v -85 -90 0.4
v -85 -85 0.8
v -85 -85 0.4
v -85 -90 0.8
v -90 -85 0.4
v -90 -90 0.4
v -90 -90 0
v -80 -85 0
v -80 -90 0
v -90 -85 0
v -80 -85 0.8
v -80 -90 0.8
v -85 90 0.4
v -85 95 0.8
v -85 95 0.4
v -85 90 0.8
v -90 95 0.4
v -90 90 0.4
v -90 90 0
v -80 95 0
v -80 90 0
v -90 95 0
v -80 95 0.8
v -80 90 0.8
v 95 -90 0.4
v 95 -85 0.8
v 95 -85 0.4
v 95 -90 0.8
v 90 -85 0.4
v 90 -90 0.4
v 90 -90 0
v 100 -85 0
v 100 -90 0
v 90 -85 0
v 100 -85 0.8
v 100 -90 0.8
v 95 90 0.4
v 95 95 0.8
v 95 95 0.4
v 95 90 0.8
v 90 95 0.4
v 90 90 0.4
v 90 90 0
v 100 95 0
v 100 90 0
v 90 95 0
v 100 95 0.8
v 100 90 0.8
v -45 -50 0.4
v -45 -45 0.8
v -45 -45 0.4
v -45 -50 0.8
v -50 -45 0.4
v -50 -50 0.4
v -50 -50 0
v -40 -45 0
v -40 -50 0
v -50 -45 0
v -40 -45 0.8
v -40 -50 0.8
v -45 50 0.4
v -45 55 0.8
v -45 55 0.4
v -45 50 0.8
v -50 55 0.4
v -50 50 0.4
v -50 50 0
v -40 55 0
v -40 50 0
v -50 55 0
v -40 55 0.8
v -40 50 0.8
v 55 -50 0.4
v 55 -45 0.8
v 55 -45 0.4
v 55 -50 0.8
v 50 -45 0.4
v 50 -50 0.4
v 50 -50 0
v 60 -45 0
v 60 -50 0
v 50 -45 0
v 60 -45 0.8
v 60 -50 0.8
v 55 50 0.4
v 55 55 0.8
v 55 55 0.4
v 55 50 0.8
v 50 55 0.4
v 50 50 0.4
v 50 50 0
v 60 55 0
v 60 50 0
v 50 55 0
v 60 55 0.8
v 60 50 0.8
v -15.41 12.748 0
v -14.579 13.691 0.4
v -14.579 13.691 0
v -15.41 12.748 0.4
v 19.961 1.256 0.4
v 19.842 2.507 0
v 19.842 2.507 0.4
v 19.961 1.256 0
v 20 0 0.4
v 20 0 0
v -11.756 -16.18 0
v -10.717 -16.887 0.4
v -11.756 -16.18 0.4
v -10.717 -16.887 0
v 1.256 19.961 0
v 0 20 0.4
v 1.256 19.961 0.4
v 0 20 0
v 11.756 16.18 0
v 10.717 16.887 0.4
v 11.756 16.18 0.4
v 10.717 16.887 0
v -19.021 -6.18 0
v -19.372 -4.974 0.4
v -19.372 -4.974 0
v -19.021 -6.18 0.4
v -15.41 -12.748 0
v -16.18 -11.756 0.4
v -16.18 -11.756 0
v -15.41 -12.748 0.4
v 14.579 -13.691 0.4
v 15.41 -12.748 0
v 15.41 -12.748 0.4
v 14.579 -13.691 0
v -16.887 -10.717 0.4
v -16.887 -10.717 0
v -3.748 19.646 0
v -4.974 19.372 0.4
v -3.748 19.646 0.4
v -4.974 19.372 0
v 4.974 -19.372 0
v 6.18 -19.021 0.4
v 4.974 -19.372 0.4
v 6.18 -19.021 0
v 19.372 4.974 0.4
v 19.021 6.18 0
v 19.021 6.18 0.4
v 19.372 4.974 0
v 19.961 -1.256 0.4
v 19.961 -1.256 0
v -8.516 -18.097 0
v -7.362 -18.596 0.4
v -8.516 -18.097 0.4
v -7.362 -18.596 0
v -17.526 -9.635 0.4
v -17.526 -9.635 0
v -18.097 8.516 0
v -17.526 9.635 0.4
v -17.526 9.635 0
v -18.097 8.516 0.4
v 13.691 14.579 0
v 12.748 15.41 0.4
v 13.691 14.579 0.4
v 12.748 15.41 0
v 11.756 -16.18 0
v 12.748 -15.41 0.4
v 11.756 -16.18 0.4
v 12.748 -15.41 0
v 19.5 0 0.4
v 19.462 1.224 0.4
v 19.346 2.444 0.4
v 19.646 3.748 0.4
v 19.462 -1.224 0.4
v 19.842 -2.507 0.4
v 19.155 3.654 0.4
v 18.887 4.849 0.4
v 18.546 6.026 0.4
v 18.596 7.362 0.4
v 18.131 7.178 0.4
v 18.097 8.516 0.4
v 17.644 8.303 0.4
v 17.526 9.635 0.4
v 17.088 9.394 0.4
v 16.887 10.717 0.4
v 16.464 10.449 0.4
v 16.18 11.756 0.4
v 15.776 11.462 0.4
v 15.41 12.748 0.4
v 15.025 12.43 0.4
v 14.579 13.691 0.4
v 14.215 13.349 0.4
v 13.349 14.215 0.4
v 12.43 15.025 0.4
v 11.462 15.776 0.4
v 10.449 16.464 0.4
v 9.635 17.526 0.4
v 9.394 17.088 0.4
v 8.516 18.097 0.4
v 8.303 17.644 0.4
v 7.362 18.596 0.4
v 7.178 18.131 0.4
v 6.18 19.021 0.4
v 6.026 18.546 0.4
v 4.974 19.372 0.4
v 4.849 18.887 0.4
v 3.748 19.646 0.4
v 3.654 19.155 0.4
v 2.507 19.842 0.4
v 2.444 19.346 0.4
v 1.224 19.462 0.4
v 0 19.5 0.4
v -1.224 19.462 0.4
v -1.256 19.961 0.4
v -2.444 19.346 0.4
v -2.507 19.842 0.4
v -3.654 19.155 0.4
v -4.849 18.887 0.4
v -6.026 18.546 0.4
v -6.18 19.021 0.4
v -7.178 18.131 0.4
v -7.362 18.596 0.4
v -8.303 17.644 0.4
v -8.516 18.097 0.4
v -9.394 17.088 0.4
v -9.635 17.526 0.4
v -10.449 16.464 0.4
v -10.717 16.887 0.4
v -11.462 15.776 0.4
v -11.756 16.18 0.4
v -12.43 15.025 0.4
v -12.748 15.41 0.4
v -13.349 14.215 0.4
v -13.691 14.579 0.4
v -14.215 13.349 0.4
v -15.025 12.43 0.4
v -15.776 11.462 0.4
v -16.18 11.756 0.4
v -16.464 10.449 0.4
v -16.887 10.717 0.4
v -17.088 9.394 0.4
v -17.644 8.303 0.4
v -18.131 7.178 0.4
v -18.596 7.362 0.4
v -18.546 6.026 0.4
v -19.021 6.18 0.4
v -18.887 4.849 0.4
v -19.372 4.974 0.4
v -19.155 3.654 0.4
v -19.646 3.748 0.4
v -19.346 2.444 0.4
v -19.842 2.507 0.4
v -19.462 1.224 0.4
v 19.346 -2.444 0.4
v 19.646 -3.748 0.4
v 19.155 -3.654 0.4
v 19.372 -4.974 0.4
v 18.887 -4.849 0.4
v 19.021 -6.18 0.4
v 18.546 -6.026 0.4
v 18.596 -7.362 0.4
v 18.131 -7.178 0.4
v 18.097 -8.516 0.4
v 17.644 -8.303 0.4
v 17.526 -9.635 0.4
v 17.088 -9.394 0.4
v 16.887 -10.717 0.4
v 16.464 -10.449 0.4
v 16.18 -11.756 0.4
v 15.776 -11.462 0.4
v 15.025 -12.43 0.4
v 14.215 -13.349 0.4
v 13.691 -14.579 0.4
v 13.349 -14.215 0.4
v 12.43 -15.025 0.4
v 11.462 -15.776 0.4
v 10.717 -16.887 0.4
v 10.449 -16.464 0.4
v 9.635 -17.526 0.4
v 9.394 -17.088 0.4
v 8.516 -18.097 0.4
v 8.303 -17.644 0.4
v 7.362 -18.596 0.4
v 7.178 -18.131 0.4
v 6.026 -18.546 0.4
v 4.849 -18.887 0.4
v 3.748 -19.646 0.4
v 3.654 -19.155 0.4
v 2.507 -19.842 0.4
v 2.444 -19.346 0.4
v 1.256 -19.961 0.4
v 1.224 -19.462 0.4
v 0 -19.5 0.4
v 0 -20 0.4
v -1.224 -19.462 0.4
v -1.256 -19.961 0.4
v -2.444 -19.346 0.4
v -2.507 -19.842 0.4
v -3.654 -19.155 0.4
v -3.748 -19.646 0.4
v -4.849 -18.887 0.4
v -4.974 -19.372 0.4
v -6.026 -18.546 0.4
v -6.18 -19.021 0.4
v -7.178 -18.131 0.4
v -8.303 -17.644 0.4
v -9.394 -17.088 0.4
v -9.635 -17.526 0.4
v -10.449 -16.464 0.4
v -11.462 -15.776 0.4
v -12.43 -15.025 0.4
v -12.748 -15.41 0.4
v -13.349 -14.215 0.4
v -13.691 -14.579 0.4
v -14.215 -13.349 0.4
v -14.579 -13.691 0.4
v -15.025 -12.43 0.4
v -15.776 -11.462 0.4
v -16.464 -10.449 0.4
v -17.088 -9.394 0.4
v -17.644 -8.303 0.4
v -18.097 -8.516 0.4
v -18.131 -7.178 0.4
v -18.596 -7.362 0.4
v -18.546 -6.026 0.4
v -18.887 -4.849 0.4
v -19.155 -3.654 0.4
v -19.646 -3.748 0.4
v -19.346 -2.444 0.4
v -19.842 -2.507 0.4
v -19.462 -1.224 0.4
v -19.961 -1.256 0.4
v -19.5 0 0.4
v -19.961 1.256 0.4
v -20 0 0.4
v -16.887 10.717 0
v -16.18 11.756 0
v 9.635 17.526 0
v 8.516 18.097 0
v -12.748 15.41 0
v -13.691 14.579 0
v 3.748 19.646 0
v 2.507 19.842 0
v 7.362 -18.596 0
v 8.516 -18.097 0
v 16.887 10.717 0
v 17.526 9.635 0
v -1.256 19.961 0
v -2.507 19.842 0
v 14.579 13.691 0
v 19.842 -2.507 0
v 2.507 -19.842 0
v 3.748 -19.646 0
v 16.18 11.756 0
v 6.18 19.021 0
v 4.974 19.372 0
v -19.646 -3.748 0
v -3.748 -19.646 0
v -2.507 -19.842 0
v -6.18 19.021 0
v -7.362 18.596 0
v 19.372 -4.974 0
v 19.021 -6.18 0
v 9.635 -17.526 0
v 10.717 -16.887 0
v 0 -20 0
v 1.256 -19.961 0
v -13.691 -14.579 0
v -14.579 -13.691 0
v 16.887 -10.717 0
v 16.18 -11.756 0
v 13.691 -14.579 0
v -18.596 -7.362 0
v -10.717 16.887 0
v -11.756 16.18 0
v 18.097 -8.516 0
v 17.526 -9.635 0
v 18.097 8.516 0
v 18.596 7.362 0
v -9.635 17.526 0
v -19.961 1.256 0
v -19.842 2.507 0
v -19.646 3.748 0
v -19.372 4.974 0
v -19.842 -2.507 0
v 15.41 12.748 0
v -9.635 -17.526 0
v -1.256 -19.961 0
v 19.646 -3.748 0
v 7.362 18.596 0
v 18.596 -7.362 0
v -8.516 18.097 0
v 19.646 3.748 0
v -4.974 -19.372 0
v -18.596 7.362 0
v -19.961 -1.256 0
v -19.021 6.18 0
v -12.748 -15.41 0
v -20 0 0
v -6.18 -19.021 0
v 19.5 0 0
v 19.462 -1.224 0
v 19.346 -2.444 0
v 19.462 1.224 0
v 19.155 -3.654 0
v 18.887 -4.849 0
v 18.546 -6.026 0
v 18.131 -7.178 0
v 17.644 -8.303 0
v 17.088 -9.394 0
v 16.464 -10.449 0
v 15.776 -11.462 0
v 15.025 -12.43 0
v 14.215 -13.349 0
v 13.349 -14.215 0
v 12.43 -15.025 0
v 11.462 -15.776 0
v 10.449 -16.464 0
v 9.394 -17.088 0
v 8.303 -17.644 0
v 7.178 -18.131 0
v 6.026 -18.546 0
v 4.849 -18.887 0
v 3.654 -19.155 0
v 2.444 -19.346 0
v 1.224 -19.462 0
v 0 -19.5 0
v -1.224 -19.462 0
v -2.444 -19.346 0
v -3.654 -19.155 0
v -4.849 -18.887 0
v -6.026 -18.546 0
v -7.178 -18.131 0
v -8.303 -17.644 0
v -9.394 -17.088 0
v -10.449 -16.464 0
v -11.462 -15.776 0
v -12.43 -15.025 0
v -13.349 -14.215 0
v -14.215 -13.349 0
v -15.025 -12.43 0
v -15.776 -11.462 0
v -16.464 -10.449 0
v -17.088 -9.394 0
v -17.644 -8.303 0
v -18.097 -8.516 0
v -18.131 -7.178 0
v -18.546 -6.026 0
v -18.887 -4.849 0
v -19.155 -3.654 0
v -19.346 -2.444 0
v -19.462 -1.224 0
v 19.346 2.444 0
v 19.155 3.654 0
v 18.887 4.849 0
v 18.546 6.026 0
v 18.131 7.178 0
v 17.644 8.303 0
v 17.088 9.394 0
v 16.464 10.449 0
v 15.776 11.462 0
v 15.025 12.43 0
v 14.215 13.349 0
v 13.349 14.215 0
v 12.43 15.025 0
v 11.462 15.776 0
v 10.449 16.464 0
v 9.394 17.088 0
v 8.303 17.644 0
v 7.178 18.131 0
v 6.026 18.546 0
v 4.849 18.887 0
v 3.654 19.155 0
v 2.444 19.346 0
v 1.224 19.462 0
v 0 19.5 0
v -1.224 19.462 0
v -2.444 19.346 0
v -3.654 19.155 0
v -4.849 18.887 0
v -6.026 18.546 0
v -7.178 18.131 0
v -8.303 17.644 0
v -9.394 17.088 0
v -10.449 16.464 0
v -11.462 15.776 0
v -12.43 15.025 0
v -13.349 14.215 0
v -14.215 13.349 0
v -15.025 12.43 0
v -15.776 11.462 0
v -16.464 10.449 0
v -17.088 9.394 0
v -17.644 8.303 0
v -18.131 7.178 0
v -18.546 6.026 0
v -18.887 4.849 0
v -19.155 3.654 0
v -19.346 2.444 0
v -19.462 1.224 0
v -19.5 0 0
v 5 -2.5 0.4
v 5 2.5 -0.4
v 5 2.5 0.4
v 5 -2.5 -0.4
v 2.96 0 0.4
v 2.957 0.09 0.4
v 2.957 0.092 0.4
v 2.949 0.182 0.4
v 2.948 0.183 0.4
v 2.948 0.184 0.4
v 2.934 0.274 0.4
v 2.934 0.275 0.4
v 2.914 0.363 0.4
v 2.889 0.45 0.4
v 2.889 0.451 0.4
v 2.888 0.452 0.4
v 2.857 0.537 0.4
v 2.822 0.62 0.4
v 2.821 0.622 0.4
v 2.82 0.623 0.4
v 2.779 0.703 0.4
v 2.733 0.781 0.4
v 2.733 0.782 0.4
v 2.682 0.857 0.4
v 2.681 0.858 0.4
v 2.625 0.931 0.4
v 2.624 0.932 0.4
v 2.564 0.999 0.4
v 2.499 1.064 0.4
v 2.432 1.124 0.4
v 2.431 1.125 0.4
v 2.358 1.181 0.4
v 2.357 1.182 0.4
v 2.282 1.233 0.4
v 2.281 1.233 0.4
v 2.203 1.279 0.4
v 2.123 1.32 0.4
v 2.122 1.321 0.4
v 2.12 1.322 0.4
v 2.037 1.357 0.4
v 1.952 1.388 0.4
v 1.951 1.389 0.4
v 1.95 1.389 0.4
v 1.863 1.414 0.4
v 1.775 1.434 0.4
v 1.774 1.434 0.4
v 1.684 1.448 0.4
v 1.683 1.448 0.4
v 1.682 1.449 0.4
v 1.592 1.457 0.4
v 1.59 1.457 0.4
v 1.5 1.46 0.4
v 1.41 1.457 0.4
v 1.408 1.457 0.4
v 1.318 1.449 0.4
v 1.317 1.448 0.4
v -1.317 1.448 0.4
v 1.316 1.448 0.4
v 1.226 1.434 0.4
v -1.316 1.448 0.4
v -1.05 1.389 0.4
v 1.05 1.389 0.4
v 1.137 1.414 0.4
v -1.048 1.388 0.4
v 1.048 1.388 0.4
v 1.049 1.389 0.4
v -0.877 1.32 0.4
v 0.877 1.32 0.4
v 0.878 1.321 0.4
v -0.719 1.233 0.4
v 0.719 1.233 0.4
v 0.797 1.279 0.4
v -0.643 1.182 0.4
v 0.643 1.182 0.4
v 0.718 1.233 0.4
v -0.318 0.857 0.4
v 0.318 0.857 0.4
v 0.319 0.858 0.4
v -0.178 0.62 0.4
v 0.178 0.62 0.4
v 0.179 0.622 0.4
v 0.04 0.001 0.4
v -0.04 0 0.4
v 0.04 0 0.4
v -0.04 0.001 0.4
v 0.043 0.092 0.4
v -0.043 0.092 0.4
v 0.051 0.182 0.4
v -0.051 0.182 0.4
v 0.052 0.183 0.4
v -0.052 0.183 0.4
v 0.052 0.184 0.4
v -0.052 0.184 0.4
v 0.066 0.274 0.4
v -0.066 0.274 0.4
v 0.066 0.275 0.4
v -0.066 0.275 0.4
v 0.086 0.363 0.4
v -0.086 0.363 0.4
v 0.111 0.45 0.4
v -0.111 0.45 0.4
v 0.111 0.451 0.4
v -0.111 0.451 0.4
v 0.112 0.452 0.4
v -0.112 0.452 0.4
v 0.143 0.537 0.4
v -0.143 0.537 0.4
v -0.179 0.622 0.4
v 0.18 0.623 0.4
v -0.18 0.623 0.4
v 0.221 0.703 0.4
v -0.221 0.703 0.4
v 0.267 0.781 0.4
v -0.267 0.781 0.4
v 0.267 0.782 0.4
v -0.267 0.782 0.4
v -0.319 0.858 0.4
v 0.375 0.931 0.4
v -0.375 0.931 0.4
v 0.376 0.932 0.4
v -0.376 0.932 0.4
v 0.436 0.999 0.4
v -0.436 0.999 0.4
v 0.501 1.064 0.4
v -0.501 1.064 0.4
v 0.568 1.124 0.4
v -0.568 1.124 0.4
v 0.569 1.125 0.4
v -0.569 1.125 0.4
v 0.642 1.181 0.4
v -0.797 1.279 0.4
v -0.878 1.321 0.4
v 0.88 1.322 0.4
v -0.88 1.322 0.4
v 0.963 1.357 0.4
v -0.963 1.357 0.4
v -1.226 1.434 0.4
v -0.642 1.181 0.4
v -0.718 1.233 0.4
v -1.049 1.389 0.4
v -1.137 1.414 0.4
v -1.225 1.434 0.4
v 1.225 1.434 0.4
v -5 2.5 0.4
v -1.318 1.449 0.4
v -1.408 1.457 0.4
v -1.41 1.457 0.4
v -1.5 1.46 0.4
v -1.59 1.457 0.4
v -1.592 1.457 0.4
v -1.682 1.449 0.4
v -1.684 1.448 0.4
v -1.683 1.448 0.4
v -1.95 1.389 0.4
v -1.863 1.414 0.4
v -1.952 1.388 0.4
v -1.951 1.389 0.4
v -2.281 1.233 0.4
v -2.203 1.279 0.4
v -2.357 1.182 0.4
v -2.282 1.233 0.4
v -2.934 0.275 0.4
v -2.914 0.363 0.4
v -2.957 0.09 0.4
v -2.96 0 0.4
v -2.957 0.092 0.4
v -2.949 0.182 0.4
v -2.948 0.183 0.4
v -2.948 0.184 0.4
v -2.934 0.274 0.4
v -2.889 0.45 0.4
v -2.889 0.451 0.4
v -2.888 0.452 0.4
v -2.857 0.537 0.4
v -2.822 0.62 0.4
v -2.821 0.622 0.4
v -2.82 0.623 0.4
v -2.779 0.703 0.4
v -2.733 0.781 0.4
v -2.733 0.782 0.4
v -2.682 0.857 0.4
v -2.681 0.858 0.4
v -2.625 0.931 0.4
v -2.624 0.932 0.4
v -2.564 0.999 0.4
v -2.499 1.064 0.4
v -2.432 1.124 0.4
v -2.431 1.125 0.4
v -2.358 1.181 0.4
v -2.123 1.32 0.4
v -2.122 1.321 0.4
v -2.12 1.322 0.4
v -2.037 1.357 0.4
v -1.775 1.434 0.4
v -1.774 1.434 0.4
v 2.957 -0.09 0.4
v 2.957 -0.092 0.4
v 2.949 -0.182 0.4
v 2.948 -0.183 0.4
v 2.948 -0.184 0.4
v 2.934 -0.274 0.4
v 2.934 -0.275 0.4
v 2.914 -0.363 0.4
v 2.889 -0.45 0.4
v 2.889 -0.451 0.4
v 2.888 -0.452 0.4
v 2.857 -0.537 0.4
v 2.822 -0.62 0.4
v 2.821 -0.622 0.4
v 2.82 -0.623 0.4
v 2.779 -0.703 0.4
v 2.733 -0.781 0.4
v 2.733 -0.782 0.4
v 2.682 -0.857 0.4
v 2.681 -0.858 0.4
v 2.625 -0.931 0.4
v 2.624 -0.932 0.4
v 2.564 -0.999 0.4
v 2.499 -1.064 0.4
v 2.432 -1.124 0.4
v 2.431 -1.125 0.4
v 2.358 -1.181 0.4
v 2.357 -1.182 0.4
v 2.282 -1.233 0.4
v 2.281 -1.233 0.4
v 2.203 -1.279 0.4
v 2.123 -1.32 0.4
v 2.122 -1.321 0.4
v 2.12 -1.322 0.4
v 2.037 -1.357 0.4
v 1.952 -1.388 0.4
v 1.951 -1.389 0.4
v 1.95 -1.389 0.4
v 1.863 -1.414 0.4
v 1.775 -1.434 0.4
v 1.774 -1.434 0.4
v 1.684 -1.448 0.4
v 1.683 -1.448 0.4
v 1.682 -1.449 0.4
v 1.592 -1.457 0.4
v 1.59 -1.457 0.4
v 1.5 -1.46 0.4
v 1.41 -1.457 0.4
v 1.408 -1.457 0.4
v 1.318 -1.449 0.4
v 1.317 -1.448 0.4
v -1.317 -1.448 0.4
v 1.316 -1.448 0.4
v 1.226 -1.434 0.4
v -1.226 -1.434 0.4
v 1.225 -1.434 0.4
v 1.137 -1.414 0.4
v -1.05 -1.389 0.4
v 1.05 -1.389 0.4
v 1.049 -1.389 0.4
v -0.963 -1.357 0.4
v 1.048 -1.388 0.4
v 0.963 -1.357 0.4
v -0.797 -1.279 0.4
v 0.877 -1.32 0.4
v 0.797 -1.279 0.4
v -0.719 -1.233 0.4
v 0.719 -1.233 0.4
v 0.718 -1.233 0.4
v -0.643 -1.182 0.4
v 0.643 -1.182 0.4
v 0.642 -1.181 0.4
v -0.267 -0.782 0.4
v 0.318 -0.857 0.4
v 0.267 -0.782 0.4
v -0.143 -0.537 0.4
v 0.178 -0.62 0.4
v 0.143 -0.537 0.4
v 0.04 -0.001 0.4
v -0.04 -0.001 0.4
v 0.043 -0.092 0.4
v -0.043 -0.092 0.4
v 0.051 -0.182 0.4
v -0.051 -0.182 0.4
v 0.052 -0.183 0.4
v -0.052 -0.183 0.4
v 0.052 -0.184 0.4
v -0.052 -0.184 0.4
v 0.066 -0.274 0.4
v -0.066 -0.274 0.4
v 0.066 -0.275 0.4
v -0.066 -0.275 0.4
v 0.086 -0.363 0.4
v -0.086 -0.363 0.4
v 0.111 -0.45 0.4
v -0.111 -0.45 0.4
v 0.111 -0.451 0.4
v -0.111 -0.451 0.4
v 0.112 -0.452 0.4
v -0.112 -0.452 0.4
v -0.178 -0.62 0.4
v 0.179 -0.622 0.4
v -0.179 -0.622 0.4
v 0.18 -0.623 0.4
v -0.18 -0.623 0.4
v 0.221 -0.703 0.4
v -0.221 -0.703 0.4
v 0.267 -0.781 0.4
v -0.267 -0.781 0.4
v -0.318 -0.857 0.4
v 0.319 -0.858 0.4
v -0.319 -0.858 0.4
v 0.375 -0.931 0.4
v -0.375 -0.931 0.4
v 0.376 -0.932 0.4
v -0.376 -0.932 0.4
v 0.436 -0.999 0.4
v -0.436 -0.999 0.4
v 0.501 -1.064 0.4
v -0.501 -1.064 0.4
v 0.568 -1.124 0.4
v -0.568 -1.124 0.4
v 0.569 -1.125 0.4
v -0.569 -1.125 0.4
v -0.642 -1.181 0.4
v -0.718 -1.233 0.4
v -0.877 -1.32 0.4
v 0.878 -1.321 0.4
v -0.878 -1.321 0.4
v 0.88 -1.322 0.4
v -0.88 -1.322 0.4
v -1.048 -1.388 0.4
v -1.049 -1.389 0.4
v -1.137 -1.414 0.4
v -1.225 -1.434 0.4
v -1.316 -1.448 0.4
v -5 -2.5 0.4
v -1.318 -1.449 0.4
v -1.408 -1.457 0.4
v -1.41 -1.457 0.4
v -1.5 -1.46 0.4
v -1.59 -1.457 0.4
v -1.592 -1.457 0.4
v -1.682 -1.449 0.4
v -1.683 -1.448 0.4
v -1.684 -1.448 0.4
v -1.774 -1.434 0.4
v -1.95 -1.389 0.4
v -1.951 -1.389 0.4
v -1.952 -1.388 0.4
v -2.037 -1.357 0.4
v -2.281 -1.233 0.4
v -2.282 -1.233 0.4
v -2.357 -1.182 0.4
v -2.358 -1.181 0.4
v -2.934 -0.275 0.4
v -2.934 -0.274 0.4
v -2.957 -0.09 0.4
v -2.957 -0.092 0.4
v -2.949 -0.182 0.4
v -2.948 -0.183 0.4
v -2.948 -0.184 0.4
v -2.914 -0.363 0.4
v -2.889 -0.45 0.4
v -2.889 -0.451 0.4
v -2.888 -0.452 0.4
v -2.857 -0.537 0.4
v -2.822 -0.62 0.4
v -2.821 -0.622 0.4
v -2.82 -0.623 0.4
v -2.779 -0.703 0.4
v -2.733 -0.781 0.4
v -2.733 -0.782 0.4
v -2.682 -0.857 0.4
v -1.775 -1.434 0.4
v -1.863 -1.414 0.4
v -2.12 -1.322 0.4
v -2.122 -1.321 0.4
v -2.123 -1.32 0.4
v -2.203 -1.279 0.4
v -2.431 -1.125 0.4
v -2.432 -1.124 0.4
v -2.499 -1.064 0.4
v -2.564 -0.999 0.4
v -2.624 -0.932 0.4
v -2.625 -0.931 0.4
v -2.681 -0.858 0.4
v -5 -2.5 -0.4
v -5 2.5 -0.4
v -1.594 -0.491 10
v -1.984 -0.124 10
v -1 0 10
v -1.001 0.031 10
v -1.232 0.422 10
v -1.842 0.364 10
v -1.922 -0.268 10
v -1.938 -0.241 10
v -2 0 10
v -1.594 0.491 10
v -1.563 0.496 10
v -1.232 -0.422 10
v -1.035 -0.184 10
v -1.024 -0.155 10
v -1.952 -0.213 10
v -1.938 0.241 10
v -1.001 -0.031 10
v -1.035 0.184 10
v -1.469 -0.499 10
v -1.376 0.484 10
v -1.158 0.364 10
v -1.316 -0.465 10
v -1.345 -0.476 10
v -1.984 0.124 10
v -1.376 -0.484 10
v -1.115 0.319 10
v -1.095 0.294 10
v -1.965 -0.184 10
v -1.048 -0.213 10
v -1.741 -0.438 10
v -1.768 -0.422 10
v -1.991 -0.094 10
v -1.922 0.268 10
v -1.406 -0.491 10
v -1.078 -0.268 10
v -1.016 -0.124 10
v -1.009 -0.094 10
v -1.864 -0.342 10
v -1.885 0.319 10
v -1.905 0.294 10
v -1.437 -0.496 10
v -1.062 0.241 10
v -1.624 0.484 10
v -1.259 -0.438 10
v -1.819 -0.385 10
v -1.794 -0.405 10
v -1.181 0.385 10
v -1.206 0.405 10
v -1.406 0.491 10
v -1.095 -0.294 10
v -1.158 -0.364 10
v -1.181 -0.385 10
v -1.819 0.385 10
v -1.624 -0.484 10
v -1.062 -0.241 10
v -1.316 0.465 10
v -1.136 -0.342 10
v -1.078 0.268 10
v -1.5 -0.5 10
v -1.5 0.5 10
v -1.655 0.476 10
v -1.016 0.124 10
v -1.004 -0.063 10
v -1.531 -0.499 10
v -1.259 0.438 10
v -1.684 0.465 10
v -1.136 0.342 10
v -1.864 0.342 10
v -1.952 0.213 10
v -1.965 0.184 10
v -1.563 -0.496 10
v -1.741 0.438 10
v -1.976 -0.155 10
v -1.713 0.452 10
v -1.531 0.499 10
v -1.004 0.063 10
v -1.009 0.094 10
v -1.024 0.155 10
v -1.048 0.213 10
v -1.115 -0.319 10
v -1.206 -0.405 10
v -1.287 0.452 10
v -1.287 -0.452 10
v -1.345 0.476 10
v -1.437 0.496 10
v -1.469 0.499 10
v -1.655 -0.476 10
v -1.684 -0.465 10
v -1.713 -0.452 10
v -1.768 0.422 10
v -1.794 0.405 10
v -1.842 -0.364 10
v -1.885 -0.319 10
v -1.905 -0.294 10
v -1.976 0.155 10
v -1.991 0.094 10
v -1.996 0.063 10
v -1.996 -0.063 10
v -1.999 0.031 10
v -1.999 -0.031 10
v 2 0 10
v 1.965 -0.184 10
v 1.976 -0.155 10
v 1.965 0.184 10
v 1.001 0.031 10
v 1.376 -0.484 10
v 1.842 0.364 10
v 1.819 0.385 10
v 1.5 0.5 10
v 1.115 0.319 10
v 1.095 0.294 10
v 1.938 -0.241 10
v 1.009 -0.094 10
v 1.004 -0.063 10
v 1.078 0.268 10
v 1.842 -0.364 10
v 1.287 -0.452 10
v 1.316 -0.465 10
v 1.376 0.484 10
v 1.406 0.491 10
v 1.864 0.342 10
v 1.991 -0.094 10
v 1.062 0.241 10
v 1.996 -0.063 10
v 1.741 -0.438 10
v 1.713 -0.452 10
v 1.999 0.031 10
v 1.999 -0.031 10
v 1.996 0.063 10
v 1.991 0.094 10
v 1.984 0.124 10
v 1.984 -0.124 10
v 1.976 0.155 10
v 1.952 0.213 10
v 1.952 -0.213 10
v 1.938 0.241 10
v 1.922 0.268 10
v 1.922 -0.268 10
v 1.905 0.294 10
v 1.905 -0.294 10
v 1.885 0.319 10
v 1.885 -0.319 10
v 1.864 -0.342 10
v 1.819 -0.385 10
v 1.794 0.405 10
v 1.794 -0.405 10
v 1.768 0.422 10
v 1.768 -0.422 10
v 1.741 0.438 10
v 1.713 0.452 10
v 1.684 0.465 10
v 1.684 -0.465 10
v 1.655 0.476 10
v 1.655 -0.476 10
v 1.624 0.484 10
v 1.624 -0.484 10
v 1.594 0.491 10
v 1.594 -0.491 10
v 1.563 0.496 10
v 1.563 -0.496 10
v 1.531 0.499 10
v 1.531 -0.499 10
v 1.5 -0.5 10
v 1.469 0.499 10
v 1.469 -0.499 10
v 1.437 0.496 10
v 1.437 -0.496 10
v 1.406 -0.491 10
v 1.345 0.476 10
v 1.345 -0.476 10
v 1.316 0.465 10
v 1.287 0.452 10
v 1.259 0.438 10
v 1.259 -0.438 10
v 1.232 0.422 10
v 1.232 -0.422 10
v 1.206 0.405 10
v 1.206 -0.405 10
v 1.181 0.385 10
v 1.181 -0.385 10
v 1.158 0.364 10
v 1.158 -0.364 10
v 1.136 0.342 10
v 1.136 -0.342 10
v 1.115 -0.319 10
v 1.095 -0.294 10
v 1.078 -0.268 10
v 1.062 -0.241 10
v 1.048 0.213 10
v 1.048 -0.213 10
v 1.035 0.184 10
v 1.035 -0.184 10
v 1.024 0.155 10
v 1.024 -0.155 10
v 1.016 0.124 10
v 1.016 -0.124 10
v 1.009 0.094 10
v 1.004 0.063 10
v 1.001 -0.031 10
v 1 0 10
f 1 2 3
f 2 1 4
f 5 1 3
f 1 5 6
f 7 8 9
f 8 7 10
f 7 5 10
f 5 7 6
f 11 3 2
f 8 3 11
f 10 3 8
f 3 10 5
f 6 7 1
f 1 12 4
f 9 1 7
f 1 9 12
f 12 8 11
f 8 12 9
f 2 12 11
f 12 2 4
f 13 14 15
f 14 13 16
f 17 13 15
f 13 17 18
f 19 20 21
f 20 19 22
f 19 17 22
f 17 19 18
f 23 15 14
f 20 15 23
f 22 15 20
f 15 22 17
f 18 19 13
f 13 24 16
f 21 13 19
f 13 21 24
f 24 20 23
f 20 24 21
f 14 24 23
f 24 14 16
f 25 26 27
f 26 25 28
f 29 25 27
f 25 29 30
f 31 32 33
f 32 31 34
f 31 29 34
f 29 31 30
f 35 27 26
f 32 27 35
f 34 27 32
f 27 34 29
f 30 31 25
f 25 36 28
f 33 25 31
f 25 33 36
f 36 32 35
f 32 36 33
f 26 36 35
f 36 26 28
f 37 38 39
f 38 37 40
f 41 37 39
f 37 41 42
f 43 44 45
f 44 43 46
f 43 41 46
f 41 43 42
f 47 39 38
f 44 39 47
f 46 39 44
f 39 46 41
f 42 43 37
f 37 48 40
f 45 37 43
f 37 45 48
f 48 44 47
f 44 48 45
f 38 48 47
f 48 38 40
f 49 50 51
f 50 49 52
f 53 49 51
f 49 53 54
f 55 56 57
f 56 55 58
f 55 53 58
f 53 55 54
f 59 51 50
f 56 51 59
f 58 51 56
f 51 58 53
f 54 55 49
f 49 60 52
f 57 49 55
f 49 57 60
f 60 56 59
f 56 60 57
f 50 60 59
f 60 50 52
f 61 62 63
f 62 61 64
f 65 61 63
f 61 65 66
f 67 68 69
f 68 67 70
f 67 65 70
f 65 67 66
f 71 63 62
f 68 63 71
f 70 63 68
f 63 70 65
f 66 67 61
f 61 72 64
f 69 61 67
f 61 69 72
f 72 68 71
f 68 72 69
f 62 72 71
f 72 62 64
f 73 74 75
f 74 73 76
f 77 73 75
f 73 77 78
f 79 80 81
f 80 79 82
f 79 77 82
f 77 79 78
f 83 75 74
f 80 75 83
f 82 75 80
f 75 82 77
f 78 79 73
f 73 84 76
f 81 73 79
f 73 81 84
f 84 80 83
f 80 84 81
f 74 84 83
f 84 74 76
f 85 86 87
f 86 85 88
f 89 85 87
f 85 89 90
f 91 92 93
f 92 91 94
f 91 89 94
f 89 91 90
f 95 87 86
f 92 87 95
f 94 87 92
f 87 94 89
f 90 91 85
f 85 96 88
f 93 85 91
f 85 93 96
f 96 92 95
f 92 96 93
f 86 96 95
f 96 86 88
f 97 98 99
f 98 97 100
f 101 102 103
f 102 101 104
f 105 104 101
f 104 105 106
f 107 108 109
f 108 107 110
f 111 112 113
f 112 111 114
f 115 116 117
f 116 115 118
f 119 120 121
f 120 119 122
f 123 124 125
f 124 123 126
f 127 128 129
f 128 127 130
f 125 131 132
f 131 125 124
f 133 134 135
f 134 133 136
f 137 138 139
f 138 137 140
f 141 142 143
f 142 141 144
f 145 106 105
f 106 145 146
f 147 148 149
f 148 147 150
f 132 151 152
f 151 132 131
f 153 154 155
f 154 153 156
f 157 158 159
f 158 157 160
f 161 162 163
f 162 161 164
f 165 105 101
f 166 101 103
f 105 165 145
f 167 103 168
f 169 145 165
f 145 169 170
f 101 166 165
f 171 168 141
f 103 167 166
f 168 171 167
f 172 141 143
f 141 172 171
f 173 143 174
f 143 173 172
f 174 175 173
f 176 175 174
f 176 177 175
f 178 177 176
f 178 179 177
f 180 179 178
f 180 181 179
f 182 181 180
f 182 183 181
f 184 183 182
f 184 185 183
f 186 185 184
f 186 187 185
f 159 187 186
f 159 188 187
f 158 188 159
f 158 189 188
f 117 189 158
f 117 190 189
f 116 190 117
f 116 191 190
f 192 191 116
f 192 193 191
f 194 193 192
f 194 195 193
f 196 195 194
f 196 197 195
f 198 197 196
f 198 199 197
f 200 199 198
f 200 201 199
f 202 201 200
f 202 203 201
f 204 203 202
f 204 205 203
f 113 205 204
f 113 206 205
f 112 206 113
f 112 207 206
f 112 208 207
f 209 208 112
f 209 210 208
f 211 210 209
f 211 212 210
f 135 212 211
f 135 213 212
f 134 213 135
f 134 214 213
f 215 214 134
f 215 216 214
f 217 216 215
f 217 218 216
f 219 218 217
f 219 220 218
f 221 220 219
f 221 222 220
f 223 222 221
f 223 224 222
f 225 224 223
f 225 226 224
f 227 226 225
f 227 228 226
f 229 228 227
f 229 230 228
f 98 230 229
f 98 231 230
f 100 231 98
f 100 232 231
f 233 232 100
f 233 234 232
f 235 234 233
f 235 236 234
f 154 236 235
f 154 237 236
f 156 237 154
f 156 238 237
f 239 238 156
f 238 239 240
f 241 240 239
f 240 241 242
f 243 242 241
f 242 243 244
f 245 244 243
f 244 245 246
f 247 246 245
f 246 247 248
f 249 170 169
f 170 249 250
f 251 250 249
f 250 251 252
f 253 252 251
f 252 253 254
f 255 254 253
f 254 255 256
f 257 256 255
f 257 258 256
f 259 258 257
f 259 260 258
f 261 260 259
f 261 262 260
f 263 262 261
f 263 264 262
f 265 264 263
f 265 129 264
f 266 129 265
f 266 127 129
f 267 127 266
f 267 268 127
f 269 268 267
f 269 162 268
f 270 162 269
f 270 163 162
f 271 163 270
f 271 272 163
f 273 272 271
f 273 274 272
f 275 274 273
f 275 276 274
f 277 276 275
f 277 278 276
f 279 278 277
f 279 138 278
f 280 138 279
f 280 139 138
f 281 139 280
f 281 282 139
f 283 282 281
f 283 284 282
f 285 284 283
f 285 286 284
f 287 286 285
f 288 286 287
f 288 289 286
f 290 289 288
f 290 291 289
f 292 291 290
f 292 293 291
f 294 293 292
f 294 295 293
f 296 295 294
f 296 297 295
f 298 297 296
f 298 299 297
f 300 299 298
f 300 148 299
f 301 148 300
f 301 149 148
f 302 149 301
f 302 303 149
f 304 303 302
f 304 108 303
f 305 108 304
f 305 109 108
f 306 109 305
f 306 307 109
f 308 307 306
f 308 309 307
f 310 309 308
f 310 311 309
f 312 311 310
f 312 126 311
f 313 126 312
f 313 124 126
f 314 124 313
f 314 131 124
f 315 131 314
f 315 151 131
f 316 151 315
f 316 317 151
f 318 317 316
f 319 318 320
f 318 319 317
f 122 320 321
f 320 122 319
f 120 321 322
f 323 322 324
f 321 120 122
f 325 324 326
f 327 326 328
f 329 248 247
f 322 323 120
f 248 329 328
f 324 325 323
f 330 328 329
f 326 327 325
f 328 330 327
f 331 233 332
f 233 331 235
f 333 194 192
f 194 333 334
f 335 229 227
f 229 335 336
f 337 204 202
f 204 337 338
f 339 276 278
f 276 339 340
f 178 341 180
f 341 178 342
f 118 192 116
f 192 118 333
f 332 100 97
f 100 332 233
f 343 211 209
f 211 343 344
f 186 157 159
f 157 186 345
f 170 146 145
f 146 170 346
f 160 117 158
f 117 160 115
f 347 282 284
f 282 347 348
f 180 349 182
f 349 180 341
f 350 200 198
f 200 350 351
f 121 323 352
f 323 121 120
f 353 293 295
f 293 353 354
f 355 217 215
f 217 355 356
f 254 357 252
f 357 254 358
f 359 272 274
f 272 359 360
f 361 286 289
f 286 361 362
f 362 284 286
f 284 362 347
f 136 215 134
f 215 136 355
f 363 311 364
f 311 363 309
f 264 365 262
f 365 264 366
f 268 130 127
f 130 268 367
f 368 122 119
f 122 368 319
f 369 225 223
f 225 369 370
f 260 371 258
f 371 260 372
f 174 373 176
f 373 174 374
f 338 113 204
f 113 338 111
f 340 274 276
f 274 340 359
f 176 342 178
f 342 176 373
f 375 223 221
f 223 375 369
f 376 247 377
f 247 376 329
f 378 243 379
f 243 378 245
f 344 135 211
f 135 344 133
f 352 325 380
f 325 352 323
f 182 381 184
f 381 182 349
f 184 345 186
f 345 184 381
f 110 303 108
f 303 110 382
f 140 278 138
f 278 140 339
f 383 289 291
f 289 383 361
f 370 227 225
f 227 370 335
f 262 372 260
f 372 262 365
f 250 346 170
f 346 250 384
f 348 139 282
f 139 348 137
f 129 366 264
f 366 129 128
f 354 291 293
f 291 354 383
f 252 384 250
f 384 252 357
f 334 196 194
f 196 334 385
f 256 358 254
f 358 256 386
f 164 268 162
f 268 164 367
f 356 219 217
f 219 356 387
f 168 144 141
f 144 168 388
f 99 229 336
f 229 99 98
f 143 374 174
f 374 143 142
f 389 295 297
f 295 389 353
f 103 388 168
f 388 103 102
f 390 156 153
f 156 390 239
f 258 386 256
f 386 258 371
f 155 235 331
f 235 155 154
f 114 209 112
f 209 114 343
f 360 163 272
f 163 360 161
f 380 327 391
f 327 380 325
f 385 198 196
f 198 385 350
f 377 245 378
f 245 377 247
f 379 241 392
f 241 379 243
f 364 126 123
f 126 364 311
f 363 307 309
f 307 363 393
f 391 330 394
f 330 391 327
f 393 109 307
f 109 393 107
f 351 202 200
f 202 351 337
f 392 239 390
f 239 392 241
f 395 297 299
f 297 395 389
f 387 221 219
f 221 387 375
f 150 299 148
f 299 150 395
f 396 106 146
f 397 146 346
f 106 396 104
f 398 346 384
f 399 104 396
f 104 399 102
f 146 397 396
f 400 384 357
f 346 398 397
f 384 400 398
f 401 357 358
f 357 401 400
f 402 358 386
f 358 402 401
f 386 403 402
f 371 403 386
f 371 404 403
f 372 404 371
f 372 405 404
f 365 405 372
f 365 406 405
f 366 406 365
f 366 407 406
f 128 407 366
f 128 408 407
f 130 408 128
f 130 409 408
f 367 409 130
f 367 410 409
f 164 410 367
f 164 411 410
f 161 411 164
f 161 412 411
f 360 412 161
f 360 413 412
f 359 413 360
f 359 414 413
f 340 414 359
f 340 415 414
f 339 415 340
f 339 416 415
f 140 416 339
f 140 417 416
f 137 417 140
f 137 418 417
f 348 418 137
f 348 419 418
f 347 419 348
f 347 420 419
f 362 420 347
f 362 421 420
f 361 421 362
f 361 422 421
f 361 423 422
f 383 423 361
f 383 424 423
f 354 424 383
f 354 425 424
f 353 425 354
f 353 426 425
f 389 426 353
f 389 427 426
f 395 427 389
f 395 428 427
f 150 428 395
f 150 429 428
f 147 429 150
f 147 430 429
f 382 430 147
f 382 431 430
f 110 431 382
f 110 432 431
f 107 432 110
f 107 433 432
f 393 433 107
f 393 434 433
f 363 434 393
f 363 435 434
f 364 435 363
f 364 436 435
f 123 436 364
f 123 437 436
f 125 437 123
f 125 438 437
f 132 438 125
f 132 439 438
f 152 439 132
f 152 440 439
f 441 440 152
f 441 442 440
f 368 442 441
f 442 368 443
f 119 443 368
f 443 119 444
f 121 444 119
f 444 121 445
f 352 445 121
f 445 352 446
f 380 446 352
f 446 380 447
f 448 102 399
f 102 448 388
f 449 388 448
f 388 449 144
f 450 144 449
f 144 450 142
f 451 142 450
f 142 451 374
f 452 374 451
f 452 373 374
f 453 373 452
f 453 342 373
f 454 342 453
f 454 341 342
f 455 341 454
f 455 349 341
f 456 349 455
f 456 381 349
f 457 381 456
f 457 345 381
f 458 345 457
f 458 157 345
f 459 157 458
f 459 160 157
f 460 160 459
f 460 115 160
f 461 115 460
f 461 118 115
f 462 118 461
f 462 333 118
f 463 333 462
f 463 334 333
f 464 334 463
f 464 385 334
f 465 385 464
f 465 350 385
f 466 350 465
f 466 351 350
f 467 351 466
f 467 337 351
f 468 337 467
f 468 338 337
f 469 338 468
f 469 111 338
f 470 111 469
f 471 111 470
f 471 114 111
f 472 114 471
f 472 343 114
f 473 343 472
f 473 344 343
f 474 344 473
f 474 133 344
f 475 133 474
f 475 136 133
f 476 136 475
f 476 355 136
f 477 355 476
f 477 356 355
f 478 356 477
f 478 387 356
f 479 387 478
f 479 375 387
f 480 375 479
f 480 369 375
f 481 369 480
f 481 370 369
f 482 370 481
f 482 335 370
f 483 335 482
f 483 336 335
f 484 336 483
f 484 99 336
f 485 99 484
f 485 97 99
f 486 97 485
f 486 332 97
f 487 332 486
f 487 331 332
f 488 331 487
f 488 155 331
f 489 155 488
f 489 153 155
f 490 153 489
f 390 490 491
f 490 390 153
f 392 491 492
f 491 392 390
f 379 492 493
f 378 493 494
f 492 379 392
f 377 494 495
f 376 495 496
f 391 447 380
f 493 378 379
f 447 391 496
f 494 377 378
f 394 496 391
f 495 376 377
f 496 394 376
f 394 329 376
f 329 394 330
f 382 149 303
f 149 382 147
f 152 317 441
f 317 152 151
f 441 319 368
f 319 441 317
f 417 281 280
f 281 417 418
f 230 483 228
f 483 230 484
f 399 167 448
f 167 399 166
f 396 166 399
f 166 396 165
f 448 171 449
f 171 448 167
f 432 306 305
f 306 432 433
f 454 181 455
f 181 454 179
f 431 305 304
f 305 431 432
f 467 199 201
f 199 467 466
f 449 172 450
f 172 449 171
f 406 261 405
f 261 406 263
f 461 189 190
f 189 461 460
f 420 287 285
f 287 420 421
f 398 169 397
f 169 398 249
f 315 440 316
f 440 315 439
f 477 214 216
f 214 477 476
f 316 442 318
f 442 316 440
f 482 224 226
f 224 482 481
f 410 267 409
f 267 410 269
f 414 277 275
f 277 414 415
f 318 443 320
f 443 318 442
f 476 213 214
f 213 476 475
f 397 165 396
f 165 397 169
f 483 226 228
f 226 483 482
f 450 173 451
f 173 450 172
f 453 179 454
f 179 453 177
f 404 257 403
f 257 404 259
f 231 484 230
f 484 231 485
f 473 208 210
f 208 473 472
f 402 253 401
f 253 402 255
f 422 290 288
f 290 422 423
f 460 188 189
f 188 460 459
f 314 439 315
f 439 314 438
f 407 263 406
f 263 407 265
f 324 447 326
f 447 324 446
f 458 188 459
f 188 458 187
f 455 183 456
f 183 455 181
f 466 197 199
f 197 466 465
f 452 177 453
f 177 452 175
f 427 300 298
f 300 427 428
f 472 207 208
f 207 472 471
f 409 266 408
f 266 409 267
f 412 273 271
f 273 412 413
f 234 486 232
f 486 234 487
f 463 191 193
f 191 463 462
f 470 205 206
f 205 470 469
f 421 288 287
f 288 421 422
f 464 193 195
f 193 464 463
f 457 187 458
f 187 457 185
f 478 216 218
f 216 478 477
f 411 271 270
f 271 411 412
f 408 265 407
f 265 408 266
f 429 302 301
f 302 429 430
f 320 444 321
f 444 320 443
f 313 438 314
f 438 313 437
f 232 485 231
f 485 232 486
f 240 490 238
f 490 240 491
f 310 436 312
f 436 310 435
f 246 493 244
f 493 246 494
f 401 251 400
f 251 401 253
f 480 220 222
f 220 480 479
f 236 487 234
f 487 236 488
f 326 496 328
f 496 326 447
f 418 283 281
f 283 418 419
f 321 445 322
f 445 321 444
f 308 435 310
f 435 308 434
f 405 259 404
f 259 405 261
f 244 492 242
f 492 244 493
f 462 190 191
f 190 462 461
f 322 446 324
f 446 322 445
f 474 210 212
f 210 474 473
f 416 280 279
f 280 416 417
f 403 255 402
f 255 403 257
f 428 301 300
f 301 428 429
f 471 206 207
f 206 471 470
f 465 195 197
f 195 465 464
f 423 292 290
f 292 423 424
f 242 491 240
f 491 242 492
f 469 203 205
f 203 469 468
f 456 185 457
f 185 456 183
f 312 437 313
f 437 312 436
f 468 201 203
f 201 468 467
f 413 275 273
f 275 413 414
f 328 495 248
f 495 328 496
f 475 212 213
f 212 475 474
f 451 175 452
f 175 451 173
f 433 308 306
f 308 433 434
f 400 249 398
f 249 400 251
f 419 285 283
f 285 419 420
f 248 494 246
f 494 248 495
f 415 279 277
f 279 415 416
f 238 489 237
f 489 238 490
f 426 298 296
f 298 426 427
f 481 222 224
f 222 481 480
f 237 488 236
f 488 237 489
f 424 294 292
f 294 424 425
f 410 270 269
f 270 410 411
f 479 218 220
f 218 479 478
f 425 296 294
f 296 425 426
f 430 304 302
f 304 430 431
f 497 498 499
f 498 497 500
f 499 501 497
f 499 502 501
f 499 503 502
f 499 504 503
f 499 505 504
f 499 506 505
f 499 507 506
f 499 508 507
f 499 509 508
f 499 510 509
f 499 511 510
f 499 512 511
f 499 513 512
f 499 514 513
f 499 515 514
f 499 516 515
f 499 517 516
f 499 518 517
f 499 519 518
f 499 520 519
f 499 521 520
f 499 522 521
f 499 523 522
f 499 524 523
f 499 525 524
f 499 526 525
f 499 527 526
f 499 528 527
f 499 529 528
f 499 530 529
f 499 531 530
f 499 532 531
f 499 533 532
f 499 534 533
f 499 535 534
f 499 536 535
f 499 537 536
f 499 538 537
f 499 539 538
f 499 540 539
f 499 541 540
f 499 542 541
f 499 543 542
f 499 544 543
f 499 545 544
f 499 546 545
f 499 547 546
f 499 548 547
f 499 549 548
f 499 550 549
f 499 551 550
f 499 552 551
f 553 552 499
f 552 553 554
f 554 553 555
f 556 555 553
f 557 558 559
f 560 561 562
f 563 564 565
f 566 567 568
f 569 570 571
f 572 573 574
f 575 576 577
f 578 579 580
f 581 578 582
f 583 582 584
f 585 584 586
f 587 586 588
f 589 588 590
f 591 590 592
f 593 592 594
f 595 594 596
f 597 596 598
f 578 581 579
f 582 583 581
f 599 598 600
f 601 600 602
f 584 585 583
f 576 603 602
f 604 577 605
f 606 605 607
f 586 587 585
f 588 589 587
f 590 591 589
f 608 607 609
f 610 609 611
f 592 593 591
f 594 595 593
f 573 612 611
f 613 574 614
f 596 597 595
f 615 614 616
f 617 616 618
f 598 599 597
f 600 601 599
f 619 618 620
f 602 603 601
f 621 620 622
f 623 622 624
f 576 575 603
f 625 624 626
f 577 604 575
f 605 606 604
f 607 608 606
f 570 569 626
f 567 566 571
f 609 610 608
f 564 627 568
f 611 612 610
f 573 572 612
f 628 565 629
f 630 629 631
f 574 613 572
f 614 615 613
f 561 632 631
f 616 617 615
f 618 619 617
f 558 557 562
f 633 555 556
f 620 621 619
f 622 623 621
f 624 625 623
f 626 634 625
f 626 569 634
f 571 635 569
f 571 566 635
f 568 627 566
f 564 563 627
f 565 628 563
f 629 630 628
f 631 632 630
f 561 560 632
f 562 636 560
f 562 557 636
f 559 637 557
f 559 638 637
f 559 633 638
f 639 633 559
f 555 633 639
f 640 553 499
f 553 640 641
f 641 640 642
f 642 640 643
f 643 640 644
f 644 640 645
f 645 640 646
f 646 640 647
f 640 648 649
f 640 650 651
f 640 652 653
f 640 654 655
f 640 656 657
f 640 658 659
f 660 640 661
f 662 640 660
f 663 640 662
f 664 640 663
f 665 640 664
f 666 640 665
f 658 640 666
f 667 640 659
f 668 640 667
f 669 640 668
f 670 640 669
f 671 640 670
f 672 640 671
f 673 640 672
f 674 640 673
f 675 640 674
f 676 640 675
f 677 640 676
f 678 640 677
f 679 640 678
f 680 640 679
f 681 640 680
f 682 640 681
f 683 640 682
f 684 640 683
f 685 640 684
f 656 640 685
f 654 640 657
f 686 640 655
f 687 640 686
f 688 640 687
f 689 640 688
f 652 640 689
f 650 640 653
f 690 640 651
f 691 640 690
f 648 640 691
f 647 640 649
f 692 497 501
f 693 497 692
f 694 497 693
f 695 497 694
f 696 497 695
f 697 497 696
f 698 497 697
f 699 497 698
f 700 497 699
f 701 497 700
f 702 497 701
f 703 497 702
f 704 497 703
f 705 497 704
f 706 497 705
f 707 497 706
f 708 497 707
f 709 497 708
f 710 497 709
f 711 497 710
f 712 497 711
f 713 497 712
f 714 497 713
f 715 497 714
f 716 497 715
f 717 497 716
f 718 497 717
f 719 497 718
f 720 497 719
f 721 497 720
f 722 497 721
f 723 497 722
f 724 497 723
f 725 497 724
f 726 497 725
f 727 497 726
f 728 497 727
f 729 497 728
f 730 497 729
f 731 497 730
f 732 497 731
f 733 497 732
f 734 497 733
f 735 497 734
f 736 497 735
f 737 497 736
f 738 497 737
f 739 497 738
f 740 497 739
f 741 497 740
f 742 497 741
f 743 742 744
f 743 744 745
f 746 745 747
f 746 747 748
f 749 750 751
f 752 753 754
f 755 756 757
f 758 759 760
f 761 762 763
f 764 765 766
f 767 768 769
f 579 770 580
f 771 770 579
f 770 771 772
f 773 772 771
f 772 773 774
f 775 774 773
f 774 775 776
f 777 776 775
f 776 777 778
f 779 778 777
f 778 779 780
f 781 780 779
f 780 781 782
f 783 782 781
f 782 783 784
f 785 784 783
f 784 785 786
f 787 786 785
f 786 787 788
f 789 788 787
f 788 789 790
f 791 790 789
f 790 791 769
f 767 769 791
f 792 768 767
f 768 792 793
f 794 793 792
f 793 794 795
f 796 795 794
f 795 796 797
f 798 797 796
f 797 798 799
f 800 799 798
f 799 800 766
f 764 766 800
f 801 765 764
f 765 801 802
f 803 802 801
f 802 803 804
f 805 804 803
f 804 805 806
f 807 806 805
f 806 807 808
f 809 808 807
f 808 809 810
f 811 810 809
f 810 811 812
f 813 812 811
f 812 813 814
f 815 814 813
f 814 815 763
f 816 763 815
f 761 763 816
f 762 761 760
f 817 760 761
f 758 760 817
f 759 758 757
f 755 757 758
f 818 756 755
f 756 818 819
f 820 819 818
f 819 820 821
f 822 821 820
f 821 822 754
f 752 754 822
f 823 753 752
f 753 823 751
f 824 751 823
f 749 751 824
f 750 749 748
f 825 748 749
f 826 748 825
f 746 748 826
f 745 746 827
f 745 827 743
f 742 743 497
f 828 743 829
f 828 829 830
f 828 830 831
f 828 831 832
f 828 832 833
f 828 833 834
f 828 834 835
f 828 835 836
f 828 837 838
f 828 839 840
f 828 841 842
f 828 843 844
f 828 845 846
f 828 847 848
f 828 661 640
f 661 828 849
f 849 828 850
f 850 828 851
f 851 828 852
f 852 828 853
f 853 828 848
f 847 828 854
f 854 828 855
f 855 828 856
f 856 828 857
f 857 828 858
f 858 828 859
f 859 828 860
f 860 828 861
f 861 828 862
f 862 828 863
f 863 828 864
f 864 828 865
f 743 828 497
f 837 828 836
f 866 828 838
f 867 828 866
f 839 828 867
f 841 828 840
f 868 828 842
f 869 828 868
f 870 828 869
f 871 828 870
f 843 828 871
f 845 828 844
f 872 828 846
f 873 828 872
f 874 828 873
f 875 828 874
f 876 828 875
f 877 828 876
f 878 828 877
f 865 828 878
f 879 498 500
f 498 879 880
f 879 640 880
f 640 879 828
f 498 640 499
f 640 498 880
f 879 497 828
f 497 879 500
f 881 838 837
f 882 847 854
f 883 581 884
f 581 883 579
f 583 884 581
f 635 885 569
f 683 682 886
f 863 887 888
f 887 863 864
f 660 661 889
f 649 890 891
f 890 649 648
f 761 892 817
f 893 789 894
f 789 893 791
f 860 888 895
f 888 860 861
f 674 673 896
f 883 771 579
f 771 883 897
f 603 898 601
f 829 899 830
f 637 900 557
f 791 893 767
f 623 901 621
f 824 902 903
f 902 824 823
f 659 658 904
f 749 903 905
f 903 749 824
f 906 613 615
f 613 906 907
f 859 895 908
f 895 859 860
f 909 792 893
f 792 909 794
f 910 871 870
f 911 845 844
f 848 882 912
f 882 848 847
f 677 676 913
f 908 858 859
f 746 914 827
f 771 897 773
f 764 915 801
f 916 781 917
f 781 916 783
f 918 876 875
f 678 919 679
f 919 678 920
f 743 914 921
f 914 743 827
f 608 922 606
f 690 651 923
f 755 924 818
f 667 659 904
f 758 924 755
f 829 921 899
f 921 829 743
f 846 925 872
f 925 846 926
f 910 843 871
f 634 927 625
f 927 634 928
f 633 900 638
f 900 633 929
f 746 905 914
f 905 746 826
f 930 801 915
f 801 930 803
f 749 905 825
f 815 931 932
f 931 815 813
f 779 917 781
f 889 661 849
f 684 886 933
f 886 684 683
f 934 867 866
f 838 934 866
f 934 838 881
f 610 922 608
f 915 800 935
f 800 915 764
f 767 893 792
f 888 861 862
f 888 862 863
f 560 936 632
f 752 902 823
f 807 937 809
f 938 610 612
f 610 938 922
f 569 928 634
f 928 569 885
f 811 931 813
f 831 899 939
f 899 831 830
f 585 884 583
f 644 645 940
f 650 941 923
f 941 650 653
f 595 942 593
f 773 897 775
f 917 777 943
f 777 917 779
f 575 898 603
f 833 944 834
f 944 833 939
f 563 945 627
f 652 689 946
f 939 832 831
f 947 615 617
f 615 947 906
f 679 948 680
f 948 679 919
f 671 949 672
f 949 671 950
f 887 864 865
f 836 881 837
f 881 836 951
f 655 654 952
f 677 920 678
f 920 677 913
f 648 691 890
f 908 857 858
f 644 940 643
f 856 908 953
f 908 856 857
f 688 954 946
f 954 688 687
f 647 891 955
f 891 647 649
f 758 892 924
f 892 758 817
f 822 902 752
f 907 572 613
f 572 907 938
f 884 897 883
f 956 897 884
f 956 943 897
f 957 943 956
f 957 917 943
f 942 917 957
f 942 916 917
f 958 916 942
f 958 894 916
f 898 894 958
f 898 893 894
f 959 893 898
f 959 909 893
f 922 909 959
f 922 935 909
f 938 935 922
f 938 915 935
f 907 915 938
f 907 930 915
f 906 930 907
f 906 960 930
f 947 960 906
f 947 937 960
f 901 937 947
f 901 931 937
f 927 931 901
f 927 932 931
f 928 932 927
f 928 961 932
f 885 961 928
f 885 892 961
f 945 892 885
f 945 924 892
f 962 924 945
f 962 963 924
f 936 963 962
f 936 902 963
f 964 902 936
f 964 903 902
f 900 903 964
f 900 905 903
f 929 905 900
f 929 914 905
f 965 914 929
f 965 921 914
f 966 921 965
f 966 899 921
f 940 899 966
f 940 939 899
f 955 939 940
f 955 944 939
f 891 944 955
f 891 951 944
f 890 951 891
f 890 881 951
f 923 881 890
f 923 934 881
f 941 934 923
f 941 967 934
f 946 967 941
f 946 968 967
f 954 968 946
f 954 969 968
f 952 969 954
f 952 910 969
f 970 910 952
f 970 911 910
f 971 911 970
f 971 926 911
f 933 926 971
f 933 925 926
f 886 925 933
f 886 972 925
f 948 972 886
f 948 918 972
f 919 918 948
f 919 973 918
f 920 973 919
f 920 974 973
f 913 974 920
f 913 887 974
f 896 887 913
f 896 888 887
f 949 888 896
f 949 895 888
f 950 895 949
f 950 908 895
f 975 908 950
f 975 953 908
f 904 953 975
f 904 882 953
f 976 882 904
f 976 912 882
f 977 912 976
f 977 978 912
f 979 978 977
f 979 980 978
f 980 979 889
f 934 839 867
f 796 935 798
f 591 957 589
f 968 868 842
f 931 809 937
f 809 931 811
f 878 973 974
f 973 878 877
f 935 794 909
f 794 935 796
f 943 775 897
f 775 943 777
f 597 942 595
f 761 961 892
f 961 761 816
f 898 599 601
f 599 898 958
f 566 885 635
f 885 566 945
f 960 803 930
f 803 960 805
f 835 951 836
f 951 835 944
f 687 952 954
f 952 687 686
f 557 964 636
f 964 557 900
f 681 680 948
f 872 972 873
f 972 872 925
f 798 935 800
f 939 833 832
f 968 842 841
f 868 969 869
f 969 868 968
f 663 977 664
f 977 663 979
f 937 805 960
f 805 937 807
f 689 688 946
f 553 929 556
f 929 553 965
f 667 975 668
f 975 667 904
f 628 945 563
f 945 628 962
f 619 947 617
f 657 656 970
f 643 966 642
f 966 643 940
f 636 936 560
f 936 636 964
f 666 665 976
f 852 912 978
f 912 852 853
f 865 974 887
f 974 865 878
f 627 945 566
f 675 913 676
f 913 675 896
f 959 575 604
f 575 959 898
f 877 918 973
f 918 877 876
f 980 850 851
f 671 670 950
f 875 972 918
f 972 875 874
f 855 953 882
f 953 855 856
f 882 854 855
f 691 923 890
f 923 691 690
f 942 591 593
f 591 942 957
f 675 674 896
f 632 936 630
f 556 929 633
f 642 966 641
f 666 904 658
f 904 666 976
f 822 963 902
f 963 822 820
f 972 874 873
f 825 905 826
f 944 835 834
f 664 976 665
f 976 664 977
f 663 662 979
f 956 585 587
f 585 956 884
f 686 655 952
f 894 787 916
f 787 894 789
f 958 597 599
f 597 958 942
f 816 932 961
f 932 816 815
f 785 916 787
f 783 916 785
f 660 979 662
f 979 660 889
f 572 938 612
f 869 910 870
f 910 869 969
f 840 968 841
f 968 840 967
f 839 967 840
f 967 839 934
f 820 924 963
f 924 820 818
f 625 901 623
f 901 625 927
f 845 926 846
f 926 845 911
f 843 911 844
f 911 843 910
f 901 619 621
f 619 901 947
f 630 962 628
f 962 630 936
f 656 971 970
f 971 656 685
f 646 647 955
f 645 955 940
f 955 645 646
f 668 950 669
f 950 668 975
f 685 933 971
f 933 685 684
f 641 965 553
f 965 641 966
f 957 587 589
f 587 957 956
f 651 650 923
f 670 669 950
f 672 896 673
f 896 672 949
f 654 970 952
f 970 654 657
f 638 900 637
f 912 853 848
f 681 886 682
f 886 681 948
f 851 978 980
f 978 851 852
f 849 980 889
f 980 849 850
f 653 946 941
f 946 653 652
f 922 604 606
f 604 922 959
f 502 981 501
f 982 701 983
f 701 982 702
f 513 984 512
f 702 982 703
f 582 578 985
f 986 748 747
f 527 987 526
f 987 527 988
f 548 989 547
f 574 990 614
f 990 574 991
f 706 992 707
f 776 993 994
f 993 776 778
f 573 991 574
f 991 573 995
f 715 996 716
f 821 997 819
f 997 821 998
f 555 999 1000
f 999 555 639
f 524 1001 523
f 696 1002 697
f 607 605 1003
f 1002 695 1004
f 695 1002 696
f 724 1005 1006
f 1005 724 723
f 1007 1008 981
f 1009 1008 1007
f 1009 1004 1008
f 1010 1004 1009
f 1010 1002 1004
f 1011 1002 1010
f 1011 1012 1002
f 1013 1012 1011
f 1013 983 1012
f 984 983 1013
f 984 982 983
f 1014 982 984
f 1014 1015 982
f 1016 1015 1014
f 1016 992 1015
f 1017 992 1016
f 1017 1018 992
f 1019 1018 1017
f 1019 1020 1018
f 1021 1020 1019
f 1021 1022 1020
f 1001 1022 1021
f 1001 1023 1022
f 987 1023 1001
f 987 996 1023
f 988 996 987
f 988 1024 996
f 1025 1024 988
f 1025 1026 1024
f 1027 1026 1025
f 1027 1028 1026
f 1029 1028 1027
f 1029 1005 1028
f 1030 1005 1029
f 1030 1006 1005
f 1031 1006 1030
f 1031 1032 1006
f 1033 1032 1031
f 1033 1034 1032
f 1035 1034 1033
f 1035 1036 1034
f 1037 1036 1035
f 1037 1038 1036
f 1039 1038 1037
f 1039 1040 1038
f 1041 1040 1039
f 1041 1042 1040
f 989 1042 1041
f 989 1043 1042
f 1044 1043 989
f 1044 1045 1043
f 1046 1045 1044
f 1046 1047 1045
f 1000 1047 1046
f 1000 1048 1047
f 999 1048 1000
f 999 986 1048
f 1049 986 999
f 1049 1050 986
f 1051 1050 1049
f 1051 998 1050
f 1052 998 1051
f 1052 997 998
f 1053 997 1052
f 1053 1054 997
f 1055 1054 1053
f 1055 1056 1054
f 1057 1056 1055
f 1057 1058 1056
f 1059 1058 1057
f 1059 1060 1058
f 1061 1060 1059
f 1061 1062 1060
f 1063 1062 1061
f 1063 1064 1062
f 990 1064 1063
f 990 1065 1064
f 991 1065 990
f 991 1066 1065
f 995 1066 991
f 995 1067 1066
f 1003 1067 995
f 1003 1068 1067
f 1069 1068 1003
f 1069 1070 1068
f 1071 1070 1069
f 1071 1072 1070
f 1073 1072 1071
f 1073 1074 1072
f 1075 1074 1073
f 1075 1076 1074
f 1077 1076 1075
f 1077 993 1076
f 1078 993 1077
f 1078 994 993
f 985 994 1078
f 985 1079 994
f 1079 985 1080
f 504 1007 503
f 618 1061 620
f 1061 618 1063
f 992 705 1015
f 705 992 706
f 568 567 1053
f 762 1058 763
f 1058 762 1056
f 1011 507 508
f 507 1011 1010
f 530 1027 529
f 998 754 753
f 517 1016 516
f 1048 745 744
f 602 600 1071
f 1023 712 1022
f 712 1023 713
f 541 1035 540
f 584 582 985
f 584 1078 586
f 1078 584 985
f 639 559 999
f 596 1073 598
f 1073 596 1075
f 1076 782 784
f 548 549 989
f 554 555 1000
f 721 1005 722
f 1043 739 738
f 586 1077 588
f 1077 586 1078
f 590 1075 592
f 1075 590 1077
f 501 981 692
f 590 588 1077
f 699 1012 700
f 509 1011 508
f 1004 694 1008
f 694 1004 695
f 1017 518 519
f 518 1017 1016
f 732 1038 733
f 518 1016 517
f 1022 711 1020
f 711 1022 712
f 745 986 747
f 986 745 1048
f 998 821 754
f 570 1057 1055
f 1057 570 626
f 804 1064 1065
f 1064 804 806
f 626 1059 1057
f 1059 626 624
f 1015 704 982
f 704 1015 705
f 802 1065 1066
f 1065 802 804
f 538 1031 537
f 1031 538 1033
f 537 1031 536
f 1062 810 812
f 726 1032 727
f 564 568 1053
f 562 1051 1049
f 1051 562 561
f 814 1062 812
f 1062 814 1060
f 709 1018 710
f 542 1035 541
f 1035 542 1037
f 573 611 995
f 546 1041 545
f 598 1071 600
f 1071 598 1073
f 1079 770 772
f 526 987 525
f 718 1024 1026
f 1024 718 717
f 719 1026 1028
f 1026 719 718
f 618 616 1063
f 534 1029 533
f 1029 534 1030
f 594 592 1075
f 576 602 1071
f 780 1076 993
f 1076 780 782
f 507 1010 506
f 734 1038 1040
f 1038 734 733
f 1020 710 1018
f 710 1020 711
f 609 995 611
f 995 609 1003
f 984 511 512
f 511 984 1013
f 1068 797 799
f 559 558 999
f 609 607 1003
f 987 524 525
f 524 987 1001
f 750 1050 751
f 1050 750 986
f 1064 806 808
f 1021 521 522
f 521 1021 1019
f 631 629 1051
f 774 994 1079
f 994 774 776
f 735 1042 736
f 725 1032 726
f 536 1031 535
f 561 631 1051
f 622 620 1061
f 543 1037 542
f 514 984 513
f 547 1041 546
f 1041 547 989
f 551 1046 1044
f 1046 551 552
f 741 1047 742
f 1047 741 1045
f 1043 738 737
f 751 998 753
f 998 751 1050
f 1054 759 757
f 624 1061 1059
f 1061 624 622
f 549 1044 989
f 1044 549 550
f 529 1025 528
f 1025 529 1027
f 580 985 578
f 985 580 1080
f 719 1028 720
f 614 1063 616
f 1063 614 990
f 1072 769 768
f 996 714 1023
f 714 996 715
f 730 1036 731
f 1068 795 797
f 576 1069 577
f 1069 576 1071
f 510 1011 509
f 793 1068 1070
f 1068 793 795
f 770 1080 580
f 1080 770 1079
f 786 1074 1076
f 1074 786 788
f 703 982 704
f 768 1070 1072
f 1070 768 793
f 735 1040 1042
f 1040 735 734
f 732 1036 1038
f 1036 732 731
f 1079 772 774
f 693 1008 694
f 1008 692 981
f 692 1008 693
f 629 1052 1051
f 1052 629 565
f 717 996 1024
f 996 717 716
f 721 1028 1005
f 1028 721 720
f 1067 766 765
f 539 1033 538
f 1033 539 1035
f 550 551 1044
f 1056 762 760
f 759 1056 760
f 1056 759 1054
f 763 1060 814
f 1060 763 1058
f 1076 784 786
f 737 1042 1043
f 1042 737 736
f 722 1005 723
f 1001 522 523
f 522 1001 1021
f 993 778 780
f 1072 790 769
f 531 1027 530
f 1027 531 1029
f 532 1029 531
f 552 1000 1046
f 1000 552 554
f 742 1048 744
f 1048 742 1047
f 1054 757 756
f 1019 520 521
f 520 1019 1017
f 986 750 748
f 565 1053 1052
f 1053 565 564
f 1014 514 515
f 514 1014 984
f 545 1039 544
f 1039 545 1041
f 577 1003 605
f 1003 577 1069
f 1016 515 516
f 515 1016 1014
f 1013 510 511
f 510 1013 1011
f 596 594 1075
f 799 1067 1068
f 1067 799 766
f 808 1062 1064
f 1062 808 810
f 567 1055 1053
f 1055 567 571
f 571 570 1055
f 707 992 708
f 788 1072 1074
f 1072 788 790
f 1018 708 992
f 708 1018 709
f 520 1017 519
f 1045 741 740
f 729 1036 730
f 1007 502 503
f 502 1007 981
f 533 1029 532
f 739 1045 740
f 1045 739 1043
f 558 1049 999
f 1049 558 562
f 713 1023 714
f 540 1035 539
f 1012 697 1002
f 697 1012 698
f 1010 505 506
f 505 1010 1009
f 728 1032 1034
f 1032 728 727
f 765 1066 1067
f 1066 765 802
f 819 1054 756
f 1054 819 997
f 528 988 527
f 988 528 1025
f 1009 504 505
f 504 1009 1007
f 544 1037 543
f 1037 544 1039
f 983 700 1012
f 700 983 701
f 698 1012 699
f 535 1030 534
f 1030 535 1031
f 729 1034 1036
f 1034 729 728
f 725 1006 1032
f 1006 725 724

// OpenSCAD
$fn=100;
h_mini=0.4;
h_big=0.8;

feld=5;


translate([-90,-90,0])aussenfeld();
translate([-90,90,0])aussenfeld();


translate([90,-90,0])aussenfeld();
translate([90,90,0])aussenfeld();

translate([-50,-50,0])aussenfeld();
translate([-50,50,0])aussenfeld();


translate([50,-50,0])aussenfeld();
translate([50,50,0])aussenfeld();

difference(){
    cylinder(d=40,h=h_mini);
    cylinder(d=39,h=h_mini);
}



retrace();


module aussenfeld(){
    cube([feld,feld,h_mini]);
    translate([feld,0,0])cube([feld,feld,h_big]);
}




module retrace(){
    cube([10,5,h_big],center=true);
    translate([-1.5,0,0])  cylinder(d1=3,d2=1,h=10);
    translate([1.5,0,0]) cylinder(d1=3,d2=1,h=10);
    
    
    
}
